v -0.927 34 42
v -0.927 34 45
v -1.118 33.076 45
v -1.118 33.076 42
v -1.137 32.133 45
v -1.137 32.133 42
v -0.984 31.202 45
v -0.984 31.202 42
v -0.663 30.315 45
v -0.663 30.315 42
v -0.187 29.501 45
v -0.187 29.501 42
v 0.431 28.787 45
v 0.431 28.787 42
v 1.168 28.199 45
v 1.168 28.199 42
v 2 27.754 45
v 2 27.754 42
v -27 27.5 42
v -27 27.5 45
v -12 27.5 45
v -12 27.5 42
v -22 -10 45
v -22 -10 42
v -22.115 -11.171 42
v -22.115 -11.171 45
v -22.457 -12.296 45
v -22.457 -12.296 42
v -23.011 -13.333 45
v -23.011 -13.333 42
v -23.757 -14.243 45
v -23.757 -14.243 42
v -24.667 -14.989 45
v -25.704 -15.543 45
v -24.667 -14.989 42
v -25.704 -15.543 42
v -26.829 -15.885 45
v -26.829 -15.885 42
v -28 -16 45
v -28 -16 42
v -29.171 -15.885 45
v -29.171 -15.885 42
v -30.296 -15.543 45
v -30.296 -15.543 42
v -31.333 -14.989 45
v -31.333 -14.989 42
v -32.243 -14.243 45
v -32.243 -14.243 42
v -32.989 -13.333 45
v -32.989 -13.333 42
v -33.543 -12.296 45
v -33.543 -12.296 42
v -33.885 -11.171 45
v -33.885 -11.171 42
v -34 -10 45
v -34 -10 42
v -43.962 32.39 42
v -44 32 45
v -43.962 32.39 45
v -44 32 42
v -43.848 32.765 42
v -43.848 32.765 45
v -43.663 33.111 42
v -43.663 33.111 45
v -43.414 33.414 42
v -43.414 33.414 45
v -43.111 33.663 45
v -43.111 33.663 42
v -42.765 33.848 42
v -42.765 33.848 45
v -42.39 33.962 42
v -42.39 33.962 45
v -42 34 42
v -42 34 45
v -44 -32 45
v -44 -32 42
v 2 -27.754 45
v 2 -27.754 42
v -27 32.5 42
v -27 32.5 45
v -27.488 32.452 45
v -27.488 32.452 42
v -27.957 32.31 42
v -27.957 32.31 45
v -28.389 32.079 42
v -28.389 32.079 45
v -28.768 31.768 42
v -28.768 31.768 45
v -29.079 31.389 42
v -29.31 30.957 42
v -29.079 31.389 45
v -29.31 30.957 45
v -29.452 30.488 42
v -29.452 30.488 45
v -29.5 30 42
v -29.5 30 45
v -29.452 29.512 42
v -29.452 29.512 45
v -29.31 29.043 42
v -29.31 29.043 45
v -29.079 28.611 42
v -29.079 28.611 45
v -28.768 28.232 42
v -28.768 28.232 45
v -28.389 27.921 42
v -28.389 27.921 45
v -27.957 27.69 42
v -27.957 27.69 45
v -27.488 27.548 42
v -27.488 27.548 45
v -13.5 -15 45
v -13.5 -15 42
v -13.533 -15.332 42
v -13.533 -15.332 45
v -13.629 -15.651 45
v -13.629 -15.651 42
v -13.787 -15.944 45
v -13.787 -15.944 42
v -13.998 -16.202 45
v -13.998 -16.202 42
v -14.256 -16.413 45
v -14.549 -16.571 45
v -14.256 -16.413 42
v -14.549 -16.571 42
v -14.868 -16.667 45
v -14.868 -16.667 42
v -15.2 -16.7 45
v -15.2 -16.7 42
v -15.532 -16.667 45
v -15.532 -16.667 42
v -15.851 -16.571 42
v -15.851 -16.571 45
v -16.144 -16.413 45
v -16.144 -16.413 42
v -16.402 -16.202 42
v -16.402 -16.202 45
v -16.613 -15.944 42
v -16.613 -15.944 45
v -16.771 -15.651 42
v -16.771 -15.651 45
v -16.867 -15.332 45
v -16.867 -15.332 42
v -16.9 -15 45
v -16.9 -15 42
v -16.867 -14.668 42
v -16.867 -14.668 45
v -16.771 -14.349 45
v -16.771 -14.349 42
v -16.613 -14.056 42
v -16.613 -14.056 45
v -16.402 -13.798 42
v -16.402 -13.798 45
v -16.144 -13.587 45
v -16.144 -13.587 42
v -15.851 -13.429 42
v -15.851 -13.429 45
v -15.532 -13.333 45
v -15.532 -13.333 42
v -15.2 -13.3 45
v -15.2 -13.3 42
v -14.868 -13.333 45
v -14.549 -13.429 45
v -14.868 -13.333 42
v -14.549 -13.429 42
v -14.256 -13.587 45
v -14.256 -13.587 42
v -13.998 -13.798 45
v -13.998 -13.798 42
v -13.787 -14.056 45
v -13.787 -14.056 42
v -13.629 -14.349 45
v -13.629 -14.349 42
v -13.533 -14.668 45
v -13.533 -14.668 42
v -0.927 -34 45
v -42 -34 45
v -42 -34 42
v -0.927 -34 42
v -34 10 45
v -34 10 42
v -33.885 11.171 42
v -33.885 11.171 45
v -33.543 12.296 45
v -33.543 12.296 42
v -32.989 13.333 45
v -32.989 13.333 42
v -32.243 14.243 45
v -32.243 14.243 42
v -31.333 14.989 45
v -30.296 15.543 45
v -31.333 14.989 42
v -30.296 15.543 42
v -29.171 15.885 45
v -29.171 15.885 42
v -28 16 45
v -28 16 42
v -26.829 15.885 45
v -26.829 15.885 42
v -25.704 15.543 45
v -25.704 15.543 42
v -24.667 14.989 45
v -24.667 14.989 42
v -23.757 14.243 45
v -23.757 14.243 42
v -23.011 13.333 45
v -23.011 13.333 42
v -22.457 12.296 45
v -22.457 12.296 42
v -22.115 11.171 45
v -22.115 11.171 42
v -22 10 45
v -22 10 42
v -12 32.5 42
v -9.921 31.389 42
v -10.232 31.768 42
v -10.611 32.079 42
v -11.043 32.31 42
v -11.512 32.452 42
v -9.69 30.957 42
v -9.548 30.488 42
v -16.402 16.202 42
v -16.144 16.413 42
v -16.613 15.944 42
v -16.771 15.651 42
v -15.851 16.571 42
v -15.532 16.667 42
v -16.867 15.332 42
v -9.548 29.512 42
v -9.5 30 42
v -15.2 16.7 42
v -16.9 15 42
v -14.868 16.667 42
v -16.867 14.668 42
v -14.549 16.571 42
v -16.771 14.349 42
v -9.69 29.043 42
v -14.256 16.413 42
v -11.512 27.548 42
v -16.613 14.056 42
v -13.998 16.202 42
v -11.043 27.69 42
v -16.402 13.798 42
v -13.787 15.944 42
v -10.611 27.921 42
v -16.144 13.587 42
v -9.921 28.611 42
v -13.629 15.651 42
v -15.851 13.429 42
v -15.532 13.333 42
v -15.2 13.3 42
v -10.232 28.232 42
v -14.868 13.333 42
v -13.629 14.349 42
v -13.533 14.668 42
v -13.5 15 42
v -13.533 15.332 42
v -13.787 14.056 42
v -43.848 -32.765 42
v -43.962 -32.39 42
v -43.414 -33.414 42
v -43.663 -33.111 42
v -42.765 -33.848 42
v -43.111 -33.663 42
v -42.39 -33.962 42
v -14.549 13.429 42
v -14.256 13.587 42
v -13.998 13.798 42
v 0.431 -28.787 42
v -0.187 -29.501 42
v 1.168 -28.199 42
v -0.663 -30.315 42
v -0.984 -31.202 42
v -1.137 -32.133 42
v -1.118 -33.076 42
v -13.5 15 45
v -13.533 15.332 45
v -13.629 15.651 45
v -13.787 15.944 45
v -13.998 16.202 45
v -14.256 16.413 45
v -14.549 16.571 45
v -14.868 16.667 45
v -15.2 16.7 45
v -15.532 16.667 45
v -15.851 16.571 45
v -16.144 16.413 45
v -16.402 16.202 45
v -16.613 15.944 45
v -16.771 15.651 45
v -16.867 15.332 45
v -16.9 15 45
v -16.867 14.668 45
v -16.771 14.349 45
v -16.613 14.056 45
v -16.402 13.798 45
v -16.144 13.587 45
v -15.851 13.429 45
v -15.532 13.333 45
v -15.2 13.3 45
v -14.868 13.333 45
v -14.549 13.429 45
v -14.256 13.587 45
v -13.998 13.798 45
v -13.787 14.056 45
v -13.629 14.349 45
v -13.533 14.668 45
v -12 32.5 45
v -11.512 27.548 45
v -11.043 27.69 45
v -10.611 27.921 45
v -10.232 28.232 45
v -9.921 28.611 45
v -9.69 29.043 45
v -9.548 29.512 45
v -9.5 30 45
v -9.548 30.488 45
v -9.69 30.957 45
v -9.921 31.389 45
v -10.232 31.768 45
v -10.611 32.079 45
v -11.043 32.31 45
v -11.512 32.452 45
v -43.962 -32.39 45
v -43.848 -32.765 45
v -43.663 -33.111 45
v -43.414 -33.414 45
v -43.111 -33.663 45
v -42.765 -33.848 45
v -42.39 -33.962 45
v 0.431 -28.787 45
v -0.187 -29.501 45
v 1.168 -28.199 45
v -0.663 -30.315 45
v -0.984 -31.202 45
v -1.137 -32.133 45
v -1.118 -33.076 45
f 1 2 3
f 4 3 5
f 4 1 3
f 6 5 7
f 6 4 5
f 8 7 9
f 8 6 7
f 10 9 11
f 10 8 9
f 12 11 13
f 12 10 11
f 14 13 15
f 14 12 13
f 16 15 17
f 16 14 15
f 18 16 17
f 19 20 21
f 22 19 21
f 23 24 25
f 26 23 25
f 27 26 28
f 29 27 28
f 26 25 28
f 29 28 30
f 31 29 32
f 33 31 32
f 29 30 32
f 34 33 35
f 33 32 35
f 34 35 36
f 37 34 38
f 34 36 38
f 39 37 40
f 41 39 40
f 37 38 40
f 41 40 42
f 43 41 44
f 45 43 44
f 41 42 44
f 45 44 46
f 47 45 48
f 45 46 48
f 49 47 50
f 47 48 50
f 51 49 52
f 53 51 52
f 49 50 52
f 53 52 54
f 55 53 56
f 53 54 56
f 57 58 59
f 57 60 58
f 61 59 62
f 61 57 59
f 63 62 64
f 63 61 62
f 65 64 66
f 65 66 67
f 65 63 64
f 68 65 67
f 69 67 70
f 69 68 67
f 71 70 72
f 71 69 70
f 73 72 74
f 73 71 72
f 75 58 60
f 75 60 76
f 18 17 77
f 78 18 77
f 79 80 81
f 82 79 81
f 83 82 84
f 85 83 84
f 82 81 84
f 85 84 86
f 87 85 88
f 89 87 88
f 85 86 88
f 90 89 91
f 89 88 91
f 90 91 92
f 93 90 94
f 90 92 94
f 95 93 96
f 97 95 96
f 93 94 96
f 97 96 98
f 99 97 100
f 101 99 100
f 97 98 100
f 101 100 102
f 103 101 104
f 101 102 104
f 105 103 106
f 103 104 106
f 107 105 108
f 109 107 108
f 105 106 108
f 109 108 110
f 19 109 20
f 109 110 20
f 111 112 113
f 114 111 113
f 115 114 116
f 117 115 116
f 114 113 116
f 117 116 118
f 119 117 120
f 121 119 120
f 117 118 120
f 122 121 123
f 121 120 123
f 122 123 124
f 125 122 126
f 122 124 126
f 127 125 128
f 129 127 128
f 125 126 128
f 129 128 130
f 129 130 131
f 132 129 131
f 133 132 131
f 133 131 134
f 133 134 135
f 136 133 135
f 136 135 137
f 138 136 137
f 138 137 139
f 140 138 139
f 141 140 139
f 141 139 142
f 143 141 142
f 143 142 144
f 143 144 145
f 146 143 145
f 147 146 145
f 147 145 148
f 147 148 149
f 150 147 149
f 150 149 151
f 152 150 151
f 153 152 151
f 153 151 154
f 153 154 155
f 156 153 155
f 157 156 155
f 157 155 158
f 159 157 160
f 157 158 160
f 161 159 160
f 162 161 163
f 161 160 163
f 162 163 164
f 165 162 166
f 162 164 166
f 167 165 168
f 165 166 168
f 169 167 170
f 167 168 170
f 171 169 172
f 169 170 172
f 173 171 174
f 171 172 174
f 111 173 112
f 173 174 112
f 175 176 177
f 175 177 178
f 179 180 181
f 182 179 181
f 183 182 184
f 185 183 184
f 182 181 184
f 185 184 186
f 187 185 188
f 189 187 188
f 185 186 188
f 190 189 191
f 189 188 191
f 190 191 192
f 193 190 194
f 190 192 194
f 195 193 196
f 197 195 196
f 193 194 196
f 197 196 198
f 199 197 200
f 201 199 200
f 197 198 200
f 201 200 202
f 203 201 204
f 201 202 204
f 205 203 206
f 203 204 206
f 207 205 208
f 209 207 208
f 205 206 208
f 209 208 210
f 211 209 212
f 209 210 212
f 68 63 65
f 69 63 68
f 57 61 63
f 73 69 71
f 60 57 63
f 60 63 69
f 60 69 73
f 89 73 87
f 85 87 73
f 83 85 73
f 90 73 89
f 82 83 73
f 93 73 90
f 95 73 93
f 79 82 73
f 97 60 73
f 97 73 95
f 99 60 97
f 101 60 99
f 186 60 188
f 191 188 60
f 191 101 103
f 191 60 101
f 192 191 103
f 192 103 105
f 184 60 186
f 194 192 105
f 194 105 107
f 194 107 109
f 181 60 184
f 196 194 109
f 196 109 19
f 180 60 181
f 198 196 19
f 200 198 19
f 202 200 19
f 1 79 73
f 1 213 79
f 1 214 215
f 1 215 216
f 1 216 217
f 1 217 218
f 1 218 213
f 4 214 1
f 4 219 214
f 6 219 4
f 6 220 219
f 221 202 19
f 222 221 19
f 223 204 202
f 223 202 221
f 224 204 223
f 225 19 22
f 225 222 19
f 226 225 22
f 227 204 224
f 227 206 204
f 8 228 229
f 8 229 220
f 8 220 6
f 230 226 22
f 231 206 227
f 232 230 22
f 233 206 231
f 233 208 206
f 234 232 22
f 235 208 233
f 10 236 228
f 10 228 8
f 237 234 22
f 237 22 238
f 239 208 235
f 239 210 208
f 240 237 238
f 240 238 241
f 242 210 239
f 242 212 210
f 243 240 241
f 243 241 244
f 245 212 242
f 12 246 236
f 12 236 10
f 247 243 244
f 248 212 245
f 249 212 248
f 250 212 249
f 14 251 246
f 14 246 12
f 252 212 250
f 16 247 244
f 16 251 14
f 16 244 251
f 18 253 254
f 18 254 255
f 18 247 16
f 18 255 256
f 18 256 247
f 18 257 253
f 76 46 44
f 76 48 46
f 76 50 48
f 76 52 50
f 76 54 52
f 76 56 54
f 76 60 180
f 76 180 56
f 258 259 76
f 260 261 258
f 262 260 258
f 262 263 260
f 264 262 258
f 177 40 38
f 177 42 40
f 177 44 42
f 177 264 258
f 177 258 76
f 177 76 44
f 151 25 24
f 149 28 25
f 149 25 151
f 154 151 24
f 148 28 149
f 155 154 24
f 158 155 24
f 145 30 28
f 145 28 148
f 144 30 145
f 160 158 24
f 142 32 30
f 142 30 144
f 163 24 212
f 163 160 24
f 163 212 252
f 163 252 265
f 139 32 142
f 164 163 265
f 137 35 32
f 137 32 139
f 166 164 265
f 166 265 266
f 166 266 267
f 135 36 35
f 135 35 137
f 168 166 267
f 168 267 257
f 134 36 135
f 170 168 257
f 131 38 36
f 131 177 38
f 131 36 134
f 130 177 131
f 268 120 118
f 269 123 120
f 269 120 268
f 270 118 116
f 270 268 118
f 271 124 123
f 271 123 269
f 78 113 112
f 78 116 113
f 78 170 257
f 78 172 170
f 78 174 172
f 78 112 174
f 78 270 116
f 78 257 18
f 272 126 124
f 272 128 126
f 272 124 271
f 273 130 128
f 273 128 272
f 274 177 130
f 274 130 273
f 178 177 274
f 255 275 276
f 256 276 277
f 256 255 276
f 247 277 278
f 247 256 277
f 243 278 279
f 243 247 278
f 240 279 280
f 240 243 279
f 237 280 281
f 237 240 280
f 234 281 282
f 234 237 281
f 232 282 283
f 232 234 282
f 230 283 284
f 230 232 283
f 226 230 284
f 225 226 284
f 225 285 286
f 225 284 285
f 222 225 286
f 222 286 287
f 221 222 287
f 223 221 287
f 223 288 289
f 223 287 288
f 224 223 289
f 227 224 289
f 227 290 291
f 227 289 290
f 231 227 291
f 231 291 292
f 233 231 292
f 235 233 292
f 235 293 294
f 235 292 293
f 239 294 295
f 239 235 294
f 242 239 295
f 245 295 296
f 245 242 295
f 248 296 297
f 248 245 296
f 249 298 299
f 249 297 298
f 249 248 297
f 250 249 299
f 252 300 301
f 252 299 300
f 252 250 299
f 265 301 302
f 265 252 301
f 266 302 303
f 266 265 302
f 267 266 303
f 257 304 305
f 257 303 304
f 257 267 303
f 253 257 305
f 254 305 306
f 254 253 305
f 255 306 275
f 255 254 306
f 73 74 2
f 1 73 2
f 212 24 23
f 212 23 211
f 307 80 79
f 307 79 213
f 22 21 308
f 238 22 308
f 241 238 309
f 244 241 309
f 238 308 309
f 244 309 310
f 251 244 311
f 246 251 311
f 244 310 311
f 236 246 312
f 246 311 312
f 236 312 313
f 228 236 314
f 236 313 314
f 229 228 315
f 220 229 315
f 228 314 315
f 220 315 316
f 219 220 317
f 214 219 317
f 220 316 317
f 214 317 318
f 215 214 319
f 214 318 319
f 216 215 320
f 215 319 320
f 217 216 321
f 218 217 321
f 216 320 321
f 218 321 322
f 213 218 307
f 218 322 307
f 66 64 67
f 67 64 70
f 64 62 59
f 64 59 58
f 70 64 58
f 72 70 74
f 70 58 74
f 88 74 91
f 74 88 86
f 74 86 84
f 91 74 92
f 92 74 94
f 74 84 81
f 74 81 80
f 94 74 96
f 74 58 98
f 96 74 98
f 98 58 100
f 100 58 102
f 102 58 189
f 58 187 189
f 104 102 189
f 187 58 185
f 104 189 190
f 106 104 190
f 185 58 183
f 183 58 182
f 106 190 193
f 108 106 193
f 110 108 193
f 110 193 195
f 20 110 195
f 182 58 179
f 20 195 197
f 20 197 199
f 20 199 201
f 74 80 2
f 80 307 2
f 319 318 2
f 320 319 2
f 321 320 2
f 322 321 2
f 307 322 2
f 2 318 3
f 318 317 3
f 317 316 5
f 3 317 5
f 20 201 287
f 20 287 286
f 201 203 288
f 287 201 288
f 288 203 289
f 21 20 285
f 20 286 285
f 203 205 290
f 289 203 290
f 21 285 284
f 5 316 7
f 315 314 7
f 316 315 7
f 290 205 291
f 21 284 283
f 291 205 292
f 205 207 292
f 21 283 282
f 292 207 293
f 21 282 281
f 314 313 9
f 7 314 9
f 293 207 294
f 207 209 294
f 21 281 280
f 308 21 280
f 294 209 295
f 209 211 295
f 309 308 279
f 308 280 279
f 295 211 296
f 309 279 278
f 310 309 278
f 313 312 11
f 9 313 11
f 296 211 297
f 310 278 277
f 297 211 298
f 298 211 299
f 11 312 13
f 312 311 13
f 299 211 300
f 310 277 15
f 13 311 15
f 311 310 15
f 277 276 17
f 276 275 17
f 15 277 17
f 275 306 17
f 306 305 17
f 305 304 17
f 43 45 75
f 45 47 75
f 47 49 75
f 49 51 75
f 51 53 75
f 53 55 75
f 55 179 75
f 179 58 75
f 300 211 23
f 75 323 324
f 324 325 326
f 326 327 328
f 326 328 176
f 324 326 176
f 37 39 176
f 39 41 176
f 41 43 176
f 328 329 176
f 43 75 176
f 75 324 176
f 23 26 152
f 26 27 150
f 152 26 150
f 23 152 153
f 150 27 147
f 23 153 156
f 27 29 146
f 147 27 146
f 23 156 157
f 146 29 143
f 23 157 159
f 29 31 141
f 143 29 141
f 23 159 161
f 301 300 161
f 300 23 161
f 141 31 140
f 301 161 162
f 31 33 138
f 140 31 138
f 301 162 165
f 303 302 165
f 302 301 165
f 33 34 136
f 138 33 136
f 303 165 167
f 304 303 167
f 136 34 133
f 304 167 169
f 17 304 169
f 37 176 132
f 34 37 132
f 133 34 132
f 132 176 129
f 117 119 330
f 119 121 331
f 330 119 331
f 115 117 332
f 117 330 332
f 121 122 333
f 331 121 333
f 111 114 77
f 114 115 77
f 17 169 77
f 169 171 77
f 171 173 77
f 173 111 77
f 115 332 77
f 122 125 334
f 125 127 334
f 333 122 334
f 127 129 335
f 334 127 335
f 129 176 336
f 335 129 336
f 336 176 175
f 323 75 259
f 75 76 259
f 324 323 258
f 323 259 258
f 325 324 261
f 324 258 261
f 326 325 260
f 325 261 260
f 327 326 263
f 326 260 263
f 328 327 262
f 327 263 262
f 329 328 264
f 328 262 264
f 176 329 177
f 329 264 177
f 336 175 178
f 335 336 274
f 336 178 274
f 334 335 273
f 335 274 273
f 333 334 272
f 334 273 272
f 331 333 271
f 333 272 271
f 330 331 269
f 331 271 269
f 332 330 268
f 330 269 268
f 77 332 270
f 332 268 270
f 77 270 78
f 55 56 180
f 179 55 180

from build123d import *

# Parameters (mm, degrees)
SKETCH035_W     = 46
SKETCH035_H     = 68
PAD010_DEPTH    = 3
FILLET006_R     = 2
SKETCH036_R     = 1.7
POCKET028_DEPTH = 167.305595
POCKET035_DEPTH = 3.001
SKETCH062_R     = 5.15
POCKET043_DEPTH = 167.305595
POCKET044_DEPTH = 3.001


with BuildPart() as part:
    # Sketch035 (on Face1 of CopyMirrored) → Pad010 (new body)
    with BuildSketch(Plane(origin=(0, 0, 45), x_dir=(1, 0, 0), z_dir=(0, 0, -1))):
        with Locations((-21, 0)):
            Rectangle(SKETCH035_W, SKETCH035_H)
    extrude(amount=PAD010_DEPTH)

    # Fillet006
    fillet006_edges = [part.edges().sort_by_distance(p)[0] for p in [
        (-44, -34, 43.5),
        (-44, 34, 43.5),
    ]]
    fillet(fillet006_edges, radius=FILLET006_R)

    # Sketch036 (on Face5 of Fillet006) → Pocket028 (cut, through all)
    with BuildSketch(Plane(origin=(0, 0, 42), x_dir=(1, 0, 0), z_dir=(0, 0, -1))):
        with Locations((-15.2, 15)):
            Circle(SKETCH036_R)
    pocket028 = extrude(amount=-POCKET028_DEPTH, mode=Mode.SUBTRACT)

    # Sketch051 → Pocket035 (cut, through all)
    with BuildSketch(Plane.XY.offset(45)):
        with BuildLine():
            ThreePointArc((-27, 32.5), (-29.5, 30), (-27, 27.5))
            Line((-27, 27.5), (-12, 27.5))
            ThreePointArc((-12, 27.5), (-9.5, 30), (-12, 32.5))
            Line((-27, 32.5), (-12, 32.5))
        make_face()
    extrude(amount=-POCKET035_DEPTH, mode=Mode.SUBTRACT)

    # Sketch062 (on Face5 of Pocket035) → Pocket043 (cut, through all)
    with BuildSketch(Plane(origin=(0, 0, 42), x_dir=(1, 0, 0), z_dir=(0, 0, -1))):
        with Locations((4, 32.5)):
            Circle(SKETCH062_R)
    pocket043 = extrude(amount=-POCKET043_DEPTH, mode=Mode.SUBTRACT)

    # Mirrored006: Pocket043, Pocket028 across XZ
    add(pocket043.mirror(Plane.XZ), mode=Mode.SUBTRACT)
    add(pocket028.mirror(Plane.XZ), mode=Mode.SUBTRACT)

    # Sketch063 (on Face4 of Mirrored006) → Pocket044 (cut, through all)
    with BuildSketch(Plane(origin=(0, 0, 42), x_dir=(1, 0, 0), z_dir=(0, 0, -1))):
        with BuildLine():
            ThreePointArc((-22, 10), (-28, 16), (-34, 10))
            Line((-34, 10), (-34, -10))
            ThreePointArc((-34, -10), (-28, -16), (-22, -10))
            Line((-22, 10), (-22, -10))
        make_face()
    extrude(amount=-POCKET044_DEPTH, mode=Mode.SUBTRACT)


solid = part.part
